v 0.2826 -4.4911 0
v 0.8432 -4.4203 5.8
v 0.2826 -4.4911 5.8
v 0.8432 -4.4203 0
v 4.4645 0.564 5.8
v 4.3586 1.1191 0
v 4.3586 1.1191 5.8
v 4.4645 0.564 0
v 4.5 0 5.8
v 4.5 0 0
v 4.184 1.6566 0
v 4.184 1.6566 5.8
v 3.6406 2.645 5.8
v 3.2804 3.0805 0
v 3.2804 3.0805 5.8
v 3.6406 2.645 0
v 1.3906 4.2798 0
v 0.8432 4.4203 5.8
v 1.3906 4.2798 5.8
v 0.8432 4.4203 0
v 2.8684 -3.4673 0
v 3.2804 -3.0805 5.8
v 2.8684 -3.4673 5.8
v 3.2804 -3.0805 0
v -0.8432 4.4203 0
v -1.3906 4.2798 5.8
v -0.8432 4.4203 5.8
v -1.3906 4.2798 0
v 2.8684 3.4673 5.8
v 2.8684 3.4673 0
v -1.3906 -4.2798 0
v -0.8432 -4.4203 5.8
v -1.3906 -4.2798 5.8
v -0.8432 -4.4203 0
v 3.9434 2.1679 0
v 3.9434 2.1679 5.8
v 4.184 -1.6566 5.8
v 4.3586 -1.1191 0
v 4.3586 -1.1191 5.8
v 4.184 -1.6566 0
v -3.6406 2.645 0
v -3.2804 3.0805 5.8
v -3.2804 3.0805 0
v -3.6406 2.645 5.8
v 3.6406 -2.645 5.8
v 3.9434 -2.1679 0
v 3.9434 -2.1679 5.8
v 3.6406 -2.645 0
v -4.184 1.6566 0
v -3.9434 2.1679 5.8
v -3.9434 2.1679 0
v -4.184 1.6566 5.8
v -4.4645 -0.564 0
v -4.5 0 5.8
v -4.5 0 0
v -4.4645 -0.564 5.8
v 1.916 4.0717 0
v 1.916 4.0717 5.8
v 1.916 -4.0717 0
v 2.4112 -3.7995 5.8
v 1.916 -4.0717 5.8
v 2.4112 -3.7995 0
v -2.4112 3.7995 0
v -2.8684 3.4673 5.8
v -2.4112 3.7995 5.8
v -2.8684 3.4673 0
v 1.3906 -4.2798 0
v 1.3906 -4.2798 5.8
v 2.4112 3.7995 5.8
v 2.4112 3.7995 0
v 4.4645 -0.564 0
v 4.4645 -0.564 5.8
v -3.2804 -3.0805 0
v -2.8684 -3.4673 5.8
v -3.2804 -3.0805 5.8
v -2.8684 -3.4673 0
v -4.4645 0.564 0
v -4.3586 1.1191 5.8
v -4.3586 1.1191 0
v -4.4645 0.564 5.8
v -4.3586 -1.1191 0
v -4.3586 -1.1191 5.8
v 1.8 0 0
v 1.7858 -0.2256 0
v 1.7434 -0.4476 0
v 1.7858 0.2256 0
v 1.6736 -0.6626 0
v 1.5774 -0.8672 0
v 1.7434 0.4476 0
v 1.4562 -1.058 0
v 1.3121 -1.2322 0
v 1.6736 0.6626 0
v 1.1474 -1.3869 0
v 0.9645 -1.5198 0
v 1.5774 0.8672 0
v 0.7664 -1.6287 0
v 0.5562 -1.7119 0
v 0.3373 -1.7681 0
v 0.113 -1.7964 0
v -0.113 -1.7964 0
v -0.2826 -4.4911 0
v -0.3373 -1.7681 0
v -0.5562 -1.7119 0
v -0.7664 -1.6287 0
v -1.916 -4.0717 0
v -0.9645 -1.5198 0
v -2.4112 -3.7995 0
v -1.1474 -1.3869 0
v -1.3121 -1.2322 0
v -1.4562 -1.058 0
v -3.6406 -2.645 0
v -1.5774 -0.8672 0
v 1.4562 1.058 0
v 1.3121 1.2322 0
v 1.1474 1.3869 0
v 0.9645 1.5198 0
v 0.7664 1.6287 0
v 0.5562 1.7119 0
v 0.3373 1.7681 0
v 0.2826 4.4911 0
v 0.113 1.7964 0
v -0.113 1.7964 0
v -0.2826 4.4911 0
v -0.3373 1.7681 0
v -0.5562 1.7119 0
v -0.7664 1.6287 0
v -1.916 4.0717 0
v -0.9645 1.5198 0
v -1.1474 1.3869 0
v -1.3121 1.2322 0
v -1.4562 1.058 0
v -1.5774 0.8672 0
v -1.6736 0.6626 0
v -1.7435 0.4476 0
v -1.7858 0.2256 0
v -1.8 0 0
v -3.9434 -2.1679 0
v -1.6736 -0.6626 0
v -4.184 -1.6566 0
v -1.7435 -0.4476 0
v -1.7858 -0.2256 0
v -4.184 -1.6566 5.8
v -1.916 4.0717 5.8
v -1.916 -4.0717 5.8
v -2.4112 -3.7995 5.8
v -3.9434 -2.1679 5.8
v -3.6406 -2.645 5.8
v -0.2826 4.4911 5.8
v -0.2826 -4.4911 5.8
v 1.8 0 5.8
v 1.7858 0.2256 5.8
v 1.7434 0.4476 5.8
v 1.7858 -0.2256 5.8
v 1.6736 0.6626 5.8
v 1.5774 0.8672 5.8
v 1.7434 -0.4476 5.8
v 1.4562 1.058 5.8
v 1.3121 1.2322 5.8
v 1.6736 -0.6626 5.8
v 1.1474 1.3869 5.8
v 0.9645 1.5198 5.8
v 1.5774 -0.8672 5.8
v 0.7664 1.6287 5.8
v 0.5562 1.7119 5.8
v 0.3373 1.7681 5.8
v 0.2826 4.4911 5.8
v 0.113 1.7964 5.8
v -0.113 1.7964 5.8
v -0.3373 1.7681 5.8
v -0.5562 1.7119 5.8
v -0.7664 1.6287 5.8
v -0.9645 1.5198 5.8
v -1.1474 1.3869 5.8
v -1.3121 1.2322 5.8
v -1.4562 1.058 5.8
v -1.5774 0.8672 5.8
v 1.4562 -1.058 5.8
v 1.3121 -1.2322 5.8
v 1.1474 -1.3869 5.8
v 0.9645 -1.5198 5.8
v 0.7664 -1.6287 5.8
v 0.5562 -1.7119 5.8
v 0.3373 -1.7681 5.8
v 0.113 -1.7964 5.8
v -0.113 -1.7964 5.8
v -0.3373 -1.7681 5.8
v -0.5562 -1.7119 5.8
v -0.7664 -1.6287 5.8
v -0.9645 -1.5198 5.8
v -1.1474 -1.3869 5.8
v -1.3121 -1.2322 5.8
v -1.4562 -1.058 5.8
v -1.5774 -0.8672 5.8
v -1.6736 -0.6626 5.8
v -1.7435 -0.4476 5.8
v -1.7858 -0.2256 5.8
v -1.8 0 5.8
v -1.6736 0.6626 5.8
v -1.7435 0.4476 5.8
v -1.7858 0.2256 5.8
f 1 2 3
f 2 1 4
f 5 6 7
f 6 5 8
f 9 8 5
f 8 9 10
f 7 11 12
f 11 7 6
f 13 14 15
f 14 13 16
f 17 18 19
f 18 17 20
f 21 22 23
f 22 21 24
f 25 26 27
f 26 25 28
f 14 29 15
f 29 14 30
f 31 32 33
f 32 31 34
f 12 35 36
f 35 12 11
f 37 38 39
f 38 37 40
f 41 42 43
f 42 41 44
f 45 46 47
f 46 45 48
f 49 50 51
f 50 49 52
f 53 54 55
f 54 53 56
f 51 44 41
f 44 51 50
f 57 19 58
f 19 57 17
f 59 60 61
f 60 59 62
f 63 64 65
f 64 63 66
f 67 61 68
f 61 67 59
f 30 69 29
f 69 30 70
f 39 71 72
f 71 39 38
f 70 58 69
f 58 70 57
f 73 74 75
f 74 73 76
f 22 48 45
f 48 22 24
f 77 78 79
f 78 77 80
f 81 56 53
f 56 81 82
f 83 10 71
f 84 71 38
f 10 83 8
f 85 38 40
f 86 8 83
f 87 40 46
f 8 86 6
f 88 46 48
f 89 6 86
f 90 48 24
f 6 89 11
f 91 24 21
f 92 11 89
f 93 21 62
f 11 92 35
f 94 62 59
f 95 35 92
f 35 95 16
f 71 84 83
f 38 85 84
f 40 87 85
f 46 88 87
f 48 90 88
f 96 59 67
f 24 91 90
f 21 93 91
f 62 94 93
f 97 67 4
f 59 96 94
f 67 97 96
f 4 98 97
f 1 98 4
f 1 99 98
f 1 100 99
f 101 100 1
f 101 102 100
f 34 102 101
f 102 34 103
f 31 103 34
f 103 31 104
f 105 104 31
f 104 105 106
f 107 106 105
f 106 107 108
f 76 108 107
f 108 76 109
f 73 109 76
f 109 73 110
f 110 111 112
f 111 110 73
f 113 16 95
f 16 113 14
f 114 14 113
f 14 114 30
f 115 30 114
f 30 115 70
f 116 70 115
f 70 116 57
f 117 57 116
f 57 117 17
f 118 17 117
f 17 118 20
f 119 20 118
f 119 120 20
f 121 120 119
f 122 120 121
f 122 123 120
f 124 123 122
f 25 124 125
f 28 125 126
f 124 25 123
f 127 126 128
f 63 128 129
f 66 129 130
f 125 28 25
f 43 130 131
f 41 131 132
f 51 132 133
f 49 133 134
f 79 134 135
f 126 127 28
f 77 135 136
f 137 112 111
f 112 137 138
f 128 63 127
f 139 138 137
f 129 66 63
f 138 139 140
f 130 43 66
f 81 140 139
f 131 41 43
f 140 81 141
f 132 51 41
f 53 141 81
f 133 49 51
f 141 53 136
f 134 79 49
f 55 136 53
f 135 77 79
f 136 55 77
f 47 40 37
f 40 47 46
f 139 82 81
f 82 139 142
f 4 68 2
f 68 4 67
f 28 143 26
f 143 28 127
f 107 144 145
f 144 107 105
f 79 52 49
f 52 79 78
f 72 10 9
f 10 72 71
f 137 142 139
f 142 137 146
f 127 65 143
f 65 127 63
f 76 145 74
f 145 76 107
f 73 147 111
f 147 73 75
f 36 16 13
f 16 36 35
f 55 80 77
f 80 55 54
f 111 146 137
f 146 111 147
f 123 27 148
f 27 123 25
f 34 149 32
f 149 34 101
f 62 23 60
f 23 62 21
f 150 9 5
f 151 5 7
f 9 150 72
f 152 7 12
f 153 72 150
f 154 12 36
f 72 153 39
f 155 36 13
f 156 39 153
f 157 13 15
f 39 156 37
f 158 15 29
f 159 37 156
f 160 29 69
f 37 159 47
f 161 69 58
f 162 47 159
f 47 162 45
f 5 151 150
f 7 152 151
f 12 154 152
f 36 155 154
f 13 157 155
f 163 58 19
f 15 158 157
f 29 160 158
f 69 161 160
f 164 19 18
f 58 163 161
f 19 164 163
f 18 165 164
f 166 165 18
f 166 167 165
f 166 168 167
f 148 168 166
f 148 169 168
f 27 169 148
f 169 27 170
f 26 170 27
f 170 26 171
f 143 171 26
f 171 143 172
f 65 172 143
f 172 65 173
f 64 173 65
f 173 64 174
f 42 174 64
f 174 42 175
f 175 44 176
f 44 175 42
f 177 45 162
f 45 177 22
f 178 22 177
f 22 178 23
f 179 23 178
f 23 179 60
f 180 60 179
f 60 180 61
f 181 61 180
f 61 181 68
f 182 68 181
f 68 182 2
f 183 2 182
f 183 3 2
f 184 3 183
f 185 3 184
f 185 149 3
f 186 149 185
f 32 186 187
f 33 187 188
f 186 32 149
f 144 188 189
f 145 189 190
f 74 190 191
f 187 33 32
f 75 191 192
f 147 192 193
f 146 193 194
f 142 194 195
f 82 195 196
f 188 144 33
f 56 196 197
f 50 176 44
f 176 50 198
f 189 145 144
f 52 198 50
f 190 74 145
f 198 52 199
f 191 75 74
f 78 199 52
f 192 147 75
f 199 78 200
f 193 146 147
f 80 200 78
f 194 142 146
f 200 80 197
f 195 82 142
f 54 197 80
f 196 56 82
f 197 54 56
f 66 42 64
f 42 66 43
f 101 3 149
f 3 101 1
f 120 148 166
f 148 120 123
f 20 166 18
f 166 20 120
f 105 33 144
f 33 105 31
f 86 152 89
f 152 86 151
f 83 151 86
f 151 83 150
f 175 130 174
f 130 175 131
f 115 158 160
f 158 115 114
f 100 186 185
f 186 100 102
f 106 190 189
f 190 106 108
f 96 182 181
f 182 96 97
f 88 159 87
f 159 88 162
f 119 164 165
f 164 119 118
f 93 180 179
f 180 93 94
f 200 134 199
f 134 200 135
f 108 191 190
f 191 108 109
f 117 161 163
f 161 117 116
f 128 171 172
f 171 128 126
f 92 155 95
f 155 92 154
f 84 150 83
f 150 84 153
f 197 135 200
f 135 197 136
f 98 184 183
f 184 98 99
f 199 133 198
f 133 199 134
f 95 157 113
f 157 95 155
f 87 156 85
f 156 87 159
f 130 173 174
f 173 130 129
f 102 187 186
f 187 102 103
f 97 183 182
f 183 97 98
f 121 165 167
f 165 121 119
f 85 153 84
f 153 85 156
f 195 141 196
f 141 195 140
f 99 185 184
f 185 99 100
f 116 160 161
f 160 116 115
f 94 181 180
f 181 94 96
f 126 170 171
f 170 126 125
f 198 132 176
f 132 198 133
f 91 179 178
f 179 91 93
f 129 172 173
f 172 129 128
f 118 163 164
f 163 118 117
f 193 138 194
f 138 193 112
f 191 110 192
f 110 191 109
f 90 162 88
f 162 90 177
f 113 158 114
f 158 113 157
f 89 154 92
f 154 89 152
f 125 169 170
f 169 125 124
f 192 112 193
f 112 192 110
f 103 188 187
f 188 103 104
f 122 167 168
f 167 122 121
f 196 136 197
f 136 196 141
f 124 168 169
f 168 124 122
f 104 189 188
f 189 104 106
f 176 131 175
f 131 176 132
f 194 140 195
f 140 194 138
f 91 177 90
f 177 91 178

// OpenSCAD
$fn = 50;

difference() {
	union() {
		translate(v = [-22.5, 7.5, -3]) {
			rotate(a = [0, 0, 0]) {
				difference() {
					union() {
						translate(v = [22.5, -7.5, 3.0]) {
							cylinder(h = 5.8, r = 4.5);
						}
					}
					union() {
						translate(v = [22.5, -7.5, 2.9]) {
							cylinder(h = 6, r = 1.8);
						}
					}
				}
			}
		}
	}
	union();
}
